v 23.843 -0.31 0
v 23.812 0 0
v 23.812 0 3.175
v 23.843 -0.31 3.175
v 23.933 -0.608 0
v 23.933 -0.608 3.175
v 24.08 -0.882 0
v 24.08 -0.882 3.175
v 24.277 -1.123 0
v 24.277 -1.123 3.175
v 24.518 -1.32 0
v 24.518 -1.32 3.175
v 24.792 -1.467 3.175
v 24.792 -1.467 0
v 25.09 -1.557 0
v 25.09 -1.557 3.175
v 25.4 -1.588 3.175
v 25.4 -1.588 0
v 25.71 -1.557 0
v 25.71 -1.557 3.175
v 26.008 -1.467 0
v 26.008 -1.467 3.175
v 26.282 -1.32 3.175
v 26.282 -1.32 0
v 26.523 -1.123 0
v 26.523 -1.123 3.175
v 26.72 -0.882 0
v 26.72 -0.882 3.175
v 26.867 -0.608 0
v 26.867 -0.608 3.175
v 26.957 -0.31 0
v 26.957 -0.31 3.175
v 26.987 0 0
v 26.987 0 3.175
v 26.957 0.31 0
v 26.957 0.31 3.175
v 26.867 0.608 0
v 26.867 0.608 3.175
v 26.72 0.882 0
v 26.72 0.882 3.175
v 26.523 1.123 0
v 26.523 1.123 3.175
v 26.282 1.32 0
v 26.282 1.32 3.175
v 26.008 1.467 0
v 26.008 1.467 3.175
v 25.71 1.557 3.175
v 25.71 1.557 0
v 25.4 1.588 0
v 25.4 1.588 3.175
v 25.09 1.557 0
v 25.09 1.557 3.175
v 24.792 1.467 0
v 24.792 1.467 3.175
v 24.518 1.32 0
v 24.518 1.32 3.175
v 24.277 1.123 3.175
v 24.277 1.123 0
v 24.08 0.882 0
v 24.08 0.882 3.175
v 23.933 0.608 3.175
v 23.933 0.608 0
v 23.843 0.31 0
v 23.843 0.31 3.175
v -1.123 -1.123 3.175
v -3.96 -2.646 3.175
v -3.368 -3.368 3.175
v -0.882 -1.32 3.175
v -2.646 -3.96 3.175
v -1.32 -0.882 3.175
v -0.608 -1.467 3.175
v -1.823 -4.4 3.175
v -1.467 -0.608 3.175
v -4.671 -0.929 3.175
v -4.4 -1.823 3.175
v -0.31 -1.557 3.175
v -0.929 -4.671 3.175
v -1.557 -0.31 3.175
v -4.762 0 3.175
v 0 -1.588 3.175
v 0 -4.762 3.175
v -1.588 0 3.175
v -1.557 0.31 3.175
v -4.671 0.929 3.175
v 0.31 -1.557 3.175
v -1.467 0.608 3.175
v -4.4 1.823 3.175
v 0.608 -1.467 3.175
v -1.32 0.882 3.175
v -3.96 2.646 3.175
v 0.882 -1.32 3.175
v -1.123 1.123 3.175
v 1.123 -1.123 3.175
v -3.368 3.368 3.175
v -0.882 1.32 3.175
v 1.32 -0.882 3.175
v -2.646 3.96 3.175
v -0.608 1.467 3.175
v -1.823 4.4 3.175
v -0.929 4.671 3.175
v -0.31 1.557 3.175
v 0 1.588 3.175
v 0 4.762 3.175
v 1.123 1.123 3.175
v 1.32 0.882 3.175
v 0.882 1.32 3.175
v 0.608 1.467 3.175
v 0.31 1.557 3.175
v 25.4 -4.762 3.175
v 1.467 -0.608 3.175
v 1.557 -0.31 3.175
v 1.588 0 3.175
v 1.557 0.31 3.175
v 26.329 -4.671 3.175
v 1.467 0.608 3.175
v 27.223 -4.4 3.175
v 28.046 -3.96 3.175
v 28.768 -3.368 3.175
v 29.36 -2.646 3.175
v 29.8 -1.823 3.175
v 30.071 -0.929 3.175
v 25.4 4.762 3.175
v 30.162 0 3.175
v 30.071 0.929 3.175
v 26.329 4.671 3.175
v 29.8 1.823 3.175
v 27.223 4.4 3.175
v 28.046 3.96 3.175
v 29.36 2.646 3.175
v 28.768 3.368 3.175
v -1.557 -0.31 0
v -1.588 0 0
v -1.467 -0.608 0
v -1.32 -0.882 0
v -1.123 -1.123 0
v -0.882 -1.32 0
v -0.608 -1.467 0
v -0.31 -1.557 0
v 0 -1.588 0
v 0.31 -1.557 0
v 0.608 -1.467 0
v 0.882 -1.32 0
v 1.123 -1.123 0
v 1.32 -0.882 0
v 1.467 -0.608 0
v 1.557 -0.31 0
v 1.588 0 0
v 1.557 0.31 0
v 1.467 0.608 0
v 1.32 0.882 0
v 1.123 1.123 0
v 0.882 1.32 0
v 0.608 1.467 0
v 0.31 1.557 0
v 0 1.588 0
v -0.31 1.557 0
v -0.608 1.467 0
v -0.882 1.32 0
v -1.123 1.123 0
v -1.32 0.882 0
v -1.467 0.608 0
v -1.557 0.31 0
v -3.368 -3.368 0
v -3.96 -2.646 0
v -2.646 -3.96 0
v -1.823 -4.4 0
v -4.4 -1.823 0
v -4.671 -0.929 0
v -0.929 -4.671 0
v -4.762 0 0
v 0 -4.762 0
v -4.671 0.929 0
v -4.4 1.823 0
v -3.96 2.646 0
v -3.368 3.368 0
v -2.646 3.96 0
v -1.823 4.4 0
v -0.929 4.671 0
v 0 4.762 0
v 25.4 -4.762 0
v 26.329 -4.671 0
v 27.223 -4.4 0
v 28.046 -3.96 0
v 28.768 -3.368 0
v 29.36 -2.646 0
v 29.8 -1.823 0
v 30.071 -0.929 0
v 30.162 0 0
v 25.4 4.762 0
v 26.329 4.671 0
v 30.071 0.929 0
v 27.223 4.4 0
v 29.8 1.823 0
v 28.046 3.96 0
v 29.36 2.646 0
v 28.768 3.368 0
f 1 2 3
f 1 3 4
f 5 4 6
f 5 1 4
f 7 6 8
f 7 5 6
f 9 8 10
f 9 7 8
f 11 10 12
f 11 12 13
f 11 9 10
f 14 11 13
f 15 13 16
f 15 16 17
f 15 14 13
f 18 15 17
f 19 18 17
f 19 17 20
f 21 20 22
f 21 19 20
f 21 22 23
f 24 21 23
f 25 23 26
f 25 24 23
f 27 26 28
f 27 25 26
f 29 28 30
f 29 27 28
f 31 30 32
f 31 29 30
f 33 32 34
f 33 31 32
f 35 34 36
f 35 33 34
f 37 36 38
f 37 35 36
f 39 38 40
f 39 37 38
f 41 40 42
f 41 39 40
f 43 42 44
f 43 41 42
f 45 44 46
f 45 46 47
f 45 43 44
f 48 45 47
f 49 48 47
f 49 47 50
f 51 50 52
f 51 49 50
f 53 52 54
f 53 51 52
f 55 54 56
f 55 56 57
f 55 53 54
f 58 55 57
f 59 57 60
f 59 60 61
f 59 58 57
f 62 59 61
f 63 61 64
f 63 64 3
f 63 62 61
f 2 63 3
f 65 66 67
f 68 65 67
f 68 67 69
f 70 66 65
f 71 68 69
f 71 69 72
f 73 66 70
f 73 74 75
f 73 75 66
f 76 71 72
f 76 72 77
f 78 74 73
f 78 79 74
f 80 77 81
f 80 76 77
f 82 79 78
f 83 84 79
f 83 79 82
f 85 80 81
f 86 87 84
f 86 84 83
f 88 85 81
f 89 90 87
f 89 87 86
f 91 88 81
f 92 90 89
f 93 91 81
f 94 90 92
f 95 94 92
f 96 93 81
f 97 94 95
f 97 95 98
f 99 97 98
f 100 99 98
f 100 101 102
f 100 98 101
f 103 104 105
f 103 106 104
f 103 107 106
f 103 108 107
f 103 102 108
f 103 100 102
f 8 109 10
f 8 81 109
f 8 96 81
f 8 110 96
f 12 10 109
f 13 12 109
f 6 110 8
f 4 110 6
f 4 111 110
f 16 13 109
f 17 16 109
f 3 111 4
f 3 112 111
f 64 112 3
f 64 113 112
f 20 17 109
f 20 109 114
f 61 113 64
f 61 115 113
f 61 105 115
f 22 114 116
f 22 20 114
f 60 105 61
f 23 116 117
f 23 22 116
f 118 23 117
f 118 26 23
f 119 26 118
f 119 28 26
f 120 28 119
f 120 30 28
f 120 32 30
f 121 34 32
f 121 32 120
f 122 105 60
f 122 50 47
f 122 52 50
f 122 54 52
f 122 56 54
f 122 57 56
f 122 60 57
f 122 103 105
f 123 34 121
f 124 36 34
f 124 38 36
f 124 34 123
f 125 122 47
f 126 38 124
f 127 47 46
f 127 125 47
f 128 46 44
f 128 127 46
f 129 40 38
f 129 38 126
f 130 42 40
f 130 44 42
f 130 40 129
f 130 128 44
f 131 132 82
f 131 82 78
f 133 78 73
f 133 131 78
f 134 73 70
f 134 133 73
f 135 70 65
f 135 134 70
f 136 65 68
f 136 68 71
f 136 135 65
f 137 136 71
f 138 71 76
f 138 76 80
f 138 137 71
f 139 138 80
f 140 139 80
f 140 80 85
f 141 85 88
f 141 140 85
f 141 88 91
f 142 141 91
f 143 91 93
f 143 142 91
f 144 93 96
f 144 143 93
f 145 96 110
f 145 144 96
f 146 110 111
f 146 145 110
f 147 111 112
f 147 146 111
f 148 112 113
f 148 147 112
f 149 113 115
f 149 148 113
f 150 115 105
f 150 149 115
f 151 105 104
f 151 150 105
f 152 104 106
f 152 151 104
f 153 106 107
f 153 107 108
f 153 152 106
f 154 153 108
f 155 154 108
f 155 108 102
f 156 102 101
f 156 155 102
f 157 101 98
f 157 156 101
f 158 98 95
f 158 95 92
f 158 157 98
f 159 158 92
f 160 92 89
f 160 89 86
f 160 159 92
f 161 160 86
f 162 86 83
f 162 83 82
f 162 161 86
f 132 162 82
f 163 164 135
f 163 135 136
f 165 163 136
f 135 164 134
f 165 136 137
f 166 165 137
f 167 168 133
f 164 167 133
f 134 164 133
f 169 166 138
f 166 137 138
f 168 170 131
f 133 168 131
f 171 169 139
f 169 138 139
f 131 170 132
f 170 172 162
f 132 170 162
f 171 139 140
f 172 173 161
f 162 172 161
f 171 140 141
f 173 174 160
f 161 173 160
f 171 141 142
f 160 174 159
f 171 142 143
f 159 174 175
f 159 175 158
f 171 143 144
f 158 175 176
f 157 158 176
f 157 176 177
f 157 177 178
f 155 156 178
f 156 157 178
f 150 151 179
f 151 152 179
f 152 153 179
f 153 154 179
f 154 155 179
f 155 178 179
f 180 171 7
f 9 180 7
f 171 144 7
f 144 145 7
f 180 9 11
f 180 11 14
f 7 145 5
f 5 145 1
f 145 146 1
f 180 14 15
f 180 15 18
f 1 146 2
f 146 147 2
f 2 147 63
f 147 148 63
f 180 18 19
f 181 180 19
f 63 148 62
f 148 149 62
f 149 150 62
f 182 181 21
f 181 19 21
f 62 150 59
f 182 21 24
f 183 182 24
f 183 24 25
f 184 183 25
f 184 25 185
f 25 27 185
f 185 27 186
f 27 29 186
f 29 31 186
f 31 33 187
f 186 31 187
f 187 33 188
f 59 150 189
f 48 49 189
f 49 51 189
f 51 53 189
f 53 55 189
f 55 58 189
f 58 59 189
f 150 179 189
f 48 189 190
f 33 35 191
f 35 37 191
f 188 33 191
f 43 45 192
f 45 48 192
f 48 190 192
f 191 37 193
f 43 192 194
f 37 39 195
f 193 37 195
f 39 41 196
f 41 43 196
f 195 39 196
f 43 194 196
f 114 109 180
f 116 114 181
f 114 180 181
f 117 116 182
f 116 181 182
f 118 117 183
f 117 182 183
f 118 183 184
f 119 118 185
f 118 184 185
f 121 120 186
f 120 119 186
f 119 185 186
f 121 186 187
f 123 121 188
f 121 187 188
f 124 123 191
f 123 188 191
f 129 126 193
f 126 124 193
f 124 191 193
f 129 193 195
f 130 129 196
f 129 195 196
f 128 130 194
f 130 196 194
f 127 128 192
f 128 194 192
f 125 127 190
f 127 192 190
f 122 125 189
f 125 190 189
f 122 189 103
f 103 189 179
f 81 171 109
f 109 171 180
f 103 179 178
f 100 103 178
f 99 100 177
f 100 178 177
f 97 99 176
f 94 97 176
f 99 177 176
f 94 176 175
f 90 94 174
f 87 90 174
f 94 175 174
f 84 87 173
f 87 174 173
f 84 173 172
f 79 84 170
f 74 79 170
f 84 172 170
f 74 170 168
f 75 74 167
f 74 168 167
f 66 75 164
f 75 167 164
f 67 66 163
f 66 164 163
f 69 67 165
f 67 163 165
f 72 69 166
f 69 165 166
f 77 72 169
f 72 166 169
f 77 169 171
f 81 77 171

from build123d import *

# Parameters (mm, degrees)
SKETCH1_R           = 4.7625
SKETCH1_R_2         = 1.5875
BOSS_EXTRUDE1_DEPTH = 3.175


with BuildPart() as part:
    # Sketch1 → Boss-Extrude1 (new body)
    # profile 1 of 3: a face of its own
    with BuildSketch(Plane.XY):
        with BuildLine():
            Line((25.4, 4.7625), (0, 4.7625))
            ThreePointArc((0, 4.7625), (3.367596045, 3.367596045), (4.7625, 0))
            ThreePointArc((4.7625, 0), (3.367596045, -3.367596045), (0, -4.7625))
            Line((0, -4.7625), (25.4, -4.7625))
            ThreePointArc((25.4, -4.7625), (20.6375, 0), (25.4, 4.7625))
        make_face()
    # profile 2 of 3: a face of its own
    with BuildSketch(Plane.XY):
        Circle(SKETCH1_R)
        with Locations(Location((0, 0, 0), (0, 0, 180))):
            Circle(SKETCH1_R_2, mode=Mode.SUBTRACT)
    # profile 3 of 3: a face of its own
    with BuildSketch(Plane.XY):
        with Locations((25.4, 0)):
            Circle(SKETCH1_R)
        with Locations(Location((25.4, 0, 0), (0, 0, 180))):
            Circle(SKETCH1_R_2, mode=Mode.SUBTRACT)
    extrude(amount=BOSS_EXTRUDE1_DEPTH)


solid = part.part
